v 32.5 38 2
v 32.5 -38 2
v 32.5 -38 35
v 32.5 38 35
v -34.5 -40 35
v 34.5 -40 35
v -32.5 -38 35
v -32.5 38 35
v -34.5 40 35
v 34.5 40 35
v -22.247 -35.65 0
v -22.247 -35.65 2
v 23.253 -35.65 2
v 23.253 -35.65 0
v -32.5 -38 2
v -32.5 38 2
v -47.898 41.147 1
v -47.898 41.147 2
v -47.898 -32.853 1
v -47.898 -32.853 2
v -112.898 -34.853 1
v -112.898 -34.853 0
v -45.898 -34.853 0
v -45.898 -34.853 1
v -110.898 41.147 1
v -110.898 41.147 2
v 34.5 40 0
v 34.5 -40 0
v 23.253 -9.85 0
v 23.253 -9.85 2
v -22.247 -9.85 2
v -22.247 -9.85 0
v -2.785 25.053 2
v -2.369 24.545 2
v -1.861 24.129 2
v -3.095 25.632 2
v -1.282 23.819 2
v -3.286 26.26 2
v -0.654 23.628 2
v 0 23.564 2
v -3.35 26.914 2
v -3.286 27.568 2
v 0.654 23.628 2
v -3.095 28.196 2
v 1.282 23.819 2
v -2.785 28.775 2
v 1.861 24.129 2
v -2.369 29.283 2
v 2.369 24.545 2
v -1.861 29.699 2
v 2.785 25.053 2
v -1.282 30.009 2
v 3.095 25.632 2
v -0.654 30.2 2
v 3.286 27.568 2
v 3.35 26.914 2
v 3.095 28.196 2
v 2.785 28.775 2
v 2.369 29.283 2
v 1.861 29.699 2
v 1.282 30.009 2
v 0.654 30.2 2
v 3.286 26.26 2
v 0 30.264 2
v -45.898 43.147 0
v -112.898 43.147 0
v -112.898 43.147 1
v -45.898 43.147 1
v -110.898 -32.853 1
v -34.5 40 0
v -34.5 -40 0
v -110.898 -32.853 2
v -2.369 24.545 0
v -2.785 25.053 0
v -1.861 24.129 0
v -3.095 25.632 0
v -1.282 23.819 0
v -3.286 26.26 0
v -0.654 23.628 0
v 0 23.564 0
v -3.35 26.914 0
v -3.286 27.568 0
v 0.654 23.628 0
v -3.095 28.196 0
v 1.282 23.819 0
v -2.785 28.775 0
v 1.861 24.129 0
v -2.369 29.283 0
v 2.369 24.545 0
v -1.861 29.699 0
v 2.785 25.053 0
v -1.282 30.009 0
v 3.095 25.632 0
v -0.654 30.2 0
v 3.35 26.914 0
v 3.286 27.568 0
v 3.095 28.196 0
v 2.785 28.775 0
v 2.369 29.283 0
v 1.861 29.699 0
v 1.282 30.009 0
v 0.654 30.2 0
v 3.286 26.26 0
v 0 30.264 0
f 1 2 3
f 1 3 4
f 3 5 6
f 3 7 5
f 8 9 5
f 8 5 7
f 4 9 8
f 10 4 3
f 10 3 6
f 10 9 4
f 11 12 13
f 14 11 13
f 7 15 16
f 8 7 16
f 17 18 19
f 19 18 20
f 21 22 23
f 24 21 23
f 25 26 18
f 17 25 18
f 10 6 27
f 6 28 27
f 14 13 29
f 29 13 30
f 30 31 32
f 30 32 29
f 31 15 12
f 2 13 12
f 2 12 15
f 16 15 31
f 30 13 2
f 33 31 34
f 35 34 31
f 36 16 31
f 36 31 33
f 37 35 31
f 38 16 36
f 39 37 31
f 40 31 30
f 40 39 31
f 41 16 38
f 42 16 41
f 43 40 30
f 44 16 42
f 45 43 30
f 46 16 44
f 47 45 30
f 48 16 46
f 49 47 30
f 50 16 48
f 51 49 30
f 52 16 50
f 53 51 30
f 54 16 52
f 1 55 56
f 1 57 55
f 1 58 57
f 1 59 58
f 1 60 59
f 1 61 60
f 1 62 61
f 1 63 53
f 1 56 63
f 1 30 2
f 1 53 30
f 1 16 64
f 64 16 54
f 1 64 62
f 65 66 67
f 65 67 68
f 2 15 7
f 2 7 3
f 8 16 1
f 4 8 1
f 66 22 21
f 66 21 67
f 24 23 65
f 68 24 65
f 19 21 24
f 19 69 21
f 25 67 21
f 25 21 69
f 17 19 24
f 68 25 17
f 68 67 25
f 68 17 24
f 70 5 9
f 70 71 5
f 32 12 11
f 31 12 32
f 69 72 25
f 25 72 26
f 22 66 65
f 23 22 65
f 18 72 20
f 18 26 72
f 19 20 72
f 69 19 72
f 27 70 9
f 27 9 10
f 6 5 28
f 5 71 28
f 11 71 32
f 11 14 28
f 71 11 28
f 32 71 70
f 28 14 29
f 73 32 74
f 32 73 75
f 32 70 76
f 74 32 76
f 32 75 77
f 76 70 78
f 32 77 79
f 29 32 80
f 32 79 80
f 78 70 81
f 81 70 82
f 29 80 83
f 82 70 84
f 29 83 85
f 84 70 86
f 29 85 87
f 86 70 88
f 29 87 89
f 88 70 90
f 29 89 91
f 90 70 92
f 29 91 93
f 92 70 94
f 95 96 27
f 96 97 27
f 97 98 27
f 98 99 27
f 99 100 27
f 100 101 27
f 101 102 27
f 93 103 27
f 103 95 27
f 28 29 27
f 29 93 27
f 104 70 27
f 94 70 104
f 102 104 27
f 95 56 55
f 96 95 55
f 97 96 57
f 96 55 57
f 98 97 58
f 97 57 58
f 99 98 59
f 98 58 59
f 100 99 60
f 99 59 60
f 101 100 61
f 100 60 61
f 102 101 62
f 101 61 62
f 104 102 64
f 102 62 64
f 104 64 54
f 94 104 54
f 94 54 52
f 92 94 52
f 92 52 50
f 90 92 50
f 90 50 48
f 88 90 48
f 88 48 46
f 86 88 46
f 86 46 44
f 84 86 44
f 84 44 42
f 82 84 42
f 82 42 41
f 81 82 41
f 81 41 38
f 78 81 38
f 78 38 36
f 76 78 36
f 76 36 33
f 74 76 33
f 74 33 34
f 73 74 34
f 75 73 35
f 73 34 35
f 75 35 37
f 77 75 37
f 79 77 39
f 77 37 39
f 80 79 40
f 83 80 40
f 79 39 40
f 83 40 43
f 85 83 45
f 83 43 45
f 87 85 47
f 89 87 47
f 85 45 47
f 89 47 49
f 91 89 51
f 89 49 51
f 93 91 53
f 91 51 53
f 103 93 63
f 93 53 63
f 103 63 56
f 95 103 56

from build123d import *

# Parameters (mm, degrees)
F0_W      = 69
F0_H      = 80
F1_DEPTH  = 2
F2_W      = 69
F2_H      = 2
F3_DEPTH  = 33
F4_W      = 2
F4_H      = 78
F5_DEPTH  = 33
F6_W      = 2
F6_H      = 78
F7_DEPTH  = 33
F8_W      = 65
F8_H      = 2
F9_DEPTH  = 33
F10_W     = 67
F10_H     = 78
F11_DEPTH = 2
F12_W     = 2
F12_H     = 74
F13_DEPTH = 1
F14_W     = 45.5
F14_H     = 25.8
F14_R     = 3.35
F15_DEPTH = 2.001


with BuildPart() as f1:
    # F0 (on Top) → F1 (new body)
    with BuildSketch(Plane.XY):
        Rectangle(F0_W, F0_H)
    extrude(amount=F1_DEPTH)

    # F2 (on face) → F3 (join)
    with BuildSketch(Plane.XY.offset(2)):
        with Locations((0, 39)):
            Rectangle(F2_W, F2_H)
    extrude(amount=F3_DEPTH)

    # F4 (on face) → F5 (join)
    with BuildSketch(Plane.XY.offset(2)):
        with Locations((-33.5, -1)):
            Rectangle(F4_W, F4_H)
    extrude(amount=F5_DEPTH)

    # F6 (on face) → F7 (join)
    with BuildSketch(Plane.XY.offset(2)):
        with Locations((33.5, -1)):
            Rectangle(F6_W, F6_H)
    extrude(amount=F7_DEPTH)

    # F8 (on face) → F9 (join)
    with BuildSketch(Plane.XY.offset(2)):
        with Locations((0, -39)):
            Rectangle(F8_W, F8_H)
    extrude(amount=F9_DEPTH)

    # F14 (on face) → F15 (cut, through all)
    with BuildSketch(Plane.XY.offset(2)):
        with Locations((0.503039, -22.749831)):
            Rectangle(F14_W, F14_H)
        with Locations((0, 26.914014)):
            Circle(F14_R)
    extrude(amount=-F15_DEPTH, mode=Mode.SUBTRACT)


with BuildPart() as f11:
    # F10 (on Top) → F11 (new body)
    with BuildSketch(Plane.XY):
        with Locations((-79.397546, 4.147368)):
            Rectangle(F10_W, F10_H)
    extrude(amount=F11_DEPTH)

    # F12 (on face) → F13 (cut)
    with BuildSketch(Plane.XY.offset(2)):
        Polygon((-112.897546, -34.852632), (-45.897546, -34.852632), (-45.897546, -32.852632), (-47.897546, -32.852632), (-110.897546, -32.852632), (-112.897546, -32.852632), align=None)
        with Locations((-111.897546, 4.147368)):
            Rectangle(F12_W, F12_H)
        Polygon((-112.897546, 43.147368), (-112.897546, 41.147368), (-110.897546, 41.147368), (-47.897546, 41.147368), (-47.897546, 43.147368), align=None)
        Polygon((-47.897546, -32.852632), (-45.897546, -32.852632), (-45.897546, 43.147368), (-47.897546, 43.147368), (-47.897546, 41.147368), align=None)
    extrude(amount=-F13_DEPTH, mode=Mode.SUBTRACT)


solid = Compound([f1.part, f11.part])
